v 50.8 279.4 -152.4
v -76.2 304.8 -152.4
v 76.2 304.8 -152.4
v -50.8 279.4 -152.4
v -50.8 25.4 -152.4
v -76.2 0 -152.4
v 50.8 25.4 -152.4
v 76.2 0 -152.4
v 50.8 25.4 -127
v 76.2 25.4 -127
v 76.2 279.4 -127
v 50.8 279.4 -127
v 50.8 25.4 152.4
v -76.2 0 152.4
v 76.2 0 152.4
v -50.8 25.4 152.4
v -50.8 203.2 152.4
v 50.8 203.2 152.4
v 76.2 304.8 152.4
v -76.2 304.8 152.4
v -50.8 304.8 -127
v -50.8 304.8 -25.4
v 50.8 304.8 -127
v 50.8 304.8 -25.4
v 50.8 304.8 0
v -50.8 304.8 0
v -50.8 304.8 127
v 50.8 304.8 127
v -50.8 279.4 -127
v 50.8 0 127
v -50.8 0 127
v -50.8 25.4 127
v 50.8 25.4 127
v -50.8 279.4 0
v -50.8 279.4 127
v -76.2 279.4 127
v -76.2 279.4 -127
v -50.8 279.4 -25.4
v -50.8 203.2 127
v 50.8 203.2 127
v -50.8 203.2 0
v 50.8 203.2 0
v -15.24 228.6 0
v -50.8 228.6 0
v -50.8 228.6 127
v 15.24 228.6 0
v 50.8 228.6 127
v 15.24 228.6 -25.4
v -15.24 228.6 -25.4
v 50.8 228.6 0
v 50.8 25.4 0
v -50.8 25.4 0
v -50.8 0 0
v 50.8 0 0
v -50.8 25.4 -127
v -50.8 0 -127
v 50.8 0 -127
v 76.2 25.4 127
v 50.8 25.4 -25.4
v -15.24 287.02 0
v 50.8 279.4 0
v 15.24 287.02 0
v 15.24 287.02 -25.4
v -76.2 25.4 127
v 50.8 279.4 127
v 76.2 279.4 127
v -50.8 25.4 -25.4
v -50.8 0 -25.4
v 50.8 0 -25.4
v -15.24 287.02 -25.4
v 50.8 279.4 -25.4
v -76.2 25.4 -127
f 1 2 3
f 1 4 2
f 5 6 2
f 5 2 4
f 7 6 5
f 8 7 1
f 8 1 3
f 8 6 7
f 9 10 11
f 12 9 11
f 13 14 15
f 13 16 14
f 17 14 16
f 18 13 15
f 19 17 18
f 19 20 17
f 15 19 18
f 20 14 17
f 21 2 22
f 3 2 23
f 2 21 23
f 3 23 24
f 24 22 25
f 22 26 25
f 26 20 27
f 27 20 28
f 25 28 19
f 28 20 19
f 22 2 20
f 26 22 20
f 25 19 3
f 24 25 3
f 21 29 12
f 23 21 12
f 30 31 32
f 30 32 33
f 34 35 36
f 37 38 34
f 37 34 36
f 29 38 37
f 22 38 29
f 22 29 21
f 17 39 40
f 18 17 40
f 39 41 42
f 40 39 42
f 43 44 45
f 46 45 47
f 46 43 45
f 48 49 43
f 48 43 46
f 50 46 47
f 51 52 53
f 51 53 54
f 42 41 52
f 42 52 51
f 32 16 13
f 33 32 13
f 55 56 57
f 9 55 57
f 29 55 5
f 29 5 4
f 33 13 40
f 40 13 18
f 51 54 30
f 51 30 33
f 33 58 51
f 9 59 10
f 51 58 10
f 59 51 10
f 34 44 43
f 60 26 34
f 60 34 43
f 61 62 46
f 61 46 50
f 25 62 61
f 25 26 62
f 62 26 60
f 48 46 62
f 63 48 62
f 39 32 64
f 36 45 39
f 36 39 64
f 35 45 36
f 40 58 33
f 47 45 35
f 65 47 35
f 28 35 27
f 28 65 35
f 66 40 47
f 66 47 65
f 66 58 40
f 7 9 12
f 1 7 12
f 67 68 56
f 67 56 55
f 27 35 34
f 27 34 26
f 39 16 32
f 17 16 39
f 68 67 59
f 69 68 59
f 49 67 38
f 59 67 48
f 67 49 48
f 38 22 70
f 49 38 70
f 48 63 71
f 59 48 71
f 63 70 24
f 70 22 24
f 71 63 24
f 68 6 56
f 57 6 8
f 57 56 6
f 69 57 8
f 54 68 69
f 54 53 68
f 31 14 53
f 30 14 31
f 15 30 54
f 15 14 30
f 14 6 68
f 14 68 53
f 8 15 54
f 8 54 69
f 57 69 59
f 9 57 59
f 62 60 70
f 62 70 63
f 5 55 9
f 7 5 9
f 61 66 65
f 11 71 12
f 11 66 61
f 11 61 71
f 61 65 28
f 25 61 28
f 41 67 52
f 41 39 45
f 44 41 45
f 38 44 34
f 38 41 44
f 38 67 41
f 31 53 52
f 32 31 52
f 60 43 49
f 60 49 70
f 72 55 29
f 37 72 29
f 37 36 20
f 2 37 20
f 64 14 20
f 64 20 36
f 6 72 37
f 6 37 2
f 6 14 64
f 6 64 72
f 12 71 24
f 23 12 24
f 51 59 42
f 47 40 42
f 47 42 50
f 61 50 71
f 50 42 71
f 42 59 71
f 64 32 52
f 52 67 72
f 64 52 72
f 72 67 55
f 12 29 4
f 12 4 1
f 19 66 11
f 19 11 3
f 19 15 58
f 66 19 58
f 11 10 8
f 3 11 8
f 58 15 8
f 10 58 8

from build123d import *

# Parameters (mm, degrees)
SKETCH1_W               = 152.4
SKETCH1_H               = 304.8
SKETCH1_W_2             = 101.6
SKETCH1_H_2             = 254
BOSS_EXTRUDE1_DEPTH     = 304.8
SKETCH2_W               = 101.6
SKETCH2_H               = 254
CUT_EXTRUDE1_DEPTH      = 304.8
SKETCH5_W               = 254
SKETCH5_H               = 254
CUT_EXTRUDE2_DEPTH      = 374.3022368
BOSS_EXTRUDE2_START     = -304.8
BOSS_EXTRUDE2_OUTLINE_W = 101.6
BOSS_EXTRUDE2_OUTLINE_H = 25.4
BOSS_EXTRUDE2_DEPTH     = 304.8
SKETCH6_W               = 101.6
SKETCH6_H               = 25.4
BOSS_EXTRUDE3_DEPTH     = 152.4
SKETCH7_W               = 30.48
SKETCH7_H               = 58.42
CUT_EXTRUDE3_DEPTH      = 25.654
SKETCH8_W               = 101.6
SKETCH8_H               = 50.8
BOSS_EXTRUDE4_DEPTH     = 25.4


# Read off the part's stored shape, not the designer's step: Boss-Extrude2
with BuildPart() as part:
    # Sketch1 → Boss-Extrude1 (new body)
    with BuildSketch(Plane(origin=(0, 0, 0), x_dir=(1, 0, 0), z_dir=(0, 1, 0))):
        Rectangle(SKETCH1_W, SKETCH1_H)
        Rectangle(SKETCH1_W_2, SKETCH1_H_2, mode=Mode.SUBTRACT)
    extrude(amount=BOSS_EXTRUDE1_DEPTH)

    # Sketch2 → Cut-Extrude1 (cut)
    with BuildSketch(Plane.XY.offset(152.4)):
        with Locations((0, 152.4)):
            Rectangle(SKETCH2_W, SKETCH2_H)
    extrude(amount=-CUT_EXTRUDE1_DEPTH, mode=Mode.SUBTRACT)

    # Sketch5 → Cut-Extrude2 (cut, through all)
    with BuildSketch(Plane(origin=(76.2, 0, 0), x_dir=(0, 0, -1), z_dir=(1, 0, 0))):
        with Locations((0, 152.4)):
            Rectangle(SKETCH5_W, SKETCH5_H)
    extrude(amount=-CUT_EXTRUDE2_DEPTH, mode=Mode.SUBTRACT)

    # Boss-Extrude2 outline → Boss-Extrude2 (add)
    with BuildSketch(Plane.XZ.offset(BOSS_EXTRUDE2_START)):
        with Locations((0, -12.7)):
            Rectangle(BOSS_EXTRUDE2_OUTLINE_W, BOSS_EXTRUDE2_OUTLINE_H)
    extrude(amount=BOSS_EXTRUDE2_DEPTH)

    # Sketch6 → Boss-Extrude3 (add)
    with BuildSketch(Plane.XY):
        with Locations((0, 215.9)):
            Rectangle(SKETCH6_W, SKETCH6_H)
    extrude(amount=BOSS_EXTRUDE3_DEPTH)

    # Sketch7 → Cut-Extrude3 (cut)
    with BuildSketch(Plane.XY):
        with Locations((0, 257.81)):
            Rectangle(SKETCH7_W, SKETCH7_H)
    extrude(amount=-CUT_EXTRUDE3_DEPTH, mode=Mode.SUBTRACT)

    # Sketch8 → Boss-Extrude4 (add)
    with BuildSketch(Plane.XY.offset(152.4)):
        with Locations((0, 254)):
            Rectangle(SKETCH8_W, SKETCH8_H)
    extrude(amount=-BOSS_EXTRUDE4_DEPTH)


solid = part.part
